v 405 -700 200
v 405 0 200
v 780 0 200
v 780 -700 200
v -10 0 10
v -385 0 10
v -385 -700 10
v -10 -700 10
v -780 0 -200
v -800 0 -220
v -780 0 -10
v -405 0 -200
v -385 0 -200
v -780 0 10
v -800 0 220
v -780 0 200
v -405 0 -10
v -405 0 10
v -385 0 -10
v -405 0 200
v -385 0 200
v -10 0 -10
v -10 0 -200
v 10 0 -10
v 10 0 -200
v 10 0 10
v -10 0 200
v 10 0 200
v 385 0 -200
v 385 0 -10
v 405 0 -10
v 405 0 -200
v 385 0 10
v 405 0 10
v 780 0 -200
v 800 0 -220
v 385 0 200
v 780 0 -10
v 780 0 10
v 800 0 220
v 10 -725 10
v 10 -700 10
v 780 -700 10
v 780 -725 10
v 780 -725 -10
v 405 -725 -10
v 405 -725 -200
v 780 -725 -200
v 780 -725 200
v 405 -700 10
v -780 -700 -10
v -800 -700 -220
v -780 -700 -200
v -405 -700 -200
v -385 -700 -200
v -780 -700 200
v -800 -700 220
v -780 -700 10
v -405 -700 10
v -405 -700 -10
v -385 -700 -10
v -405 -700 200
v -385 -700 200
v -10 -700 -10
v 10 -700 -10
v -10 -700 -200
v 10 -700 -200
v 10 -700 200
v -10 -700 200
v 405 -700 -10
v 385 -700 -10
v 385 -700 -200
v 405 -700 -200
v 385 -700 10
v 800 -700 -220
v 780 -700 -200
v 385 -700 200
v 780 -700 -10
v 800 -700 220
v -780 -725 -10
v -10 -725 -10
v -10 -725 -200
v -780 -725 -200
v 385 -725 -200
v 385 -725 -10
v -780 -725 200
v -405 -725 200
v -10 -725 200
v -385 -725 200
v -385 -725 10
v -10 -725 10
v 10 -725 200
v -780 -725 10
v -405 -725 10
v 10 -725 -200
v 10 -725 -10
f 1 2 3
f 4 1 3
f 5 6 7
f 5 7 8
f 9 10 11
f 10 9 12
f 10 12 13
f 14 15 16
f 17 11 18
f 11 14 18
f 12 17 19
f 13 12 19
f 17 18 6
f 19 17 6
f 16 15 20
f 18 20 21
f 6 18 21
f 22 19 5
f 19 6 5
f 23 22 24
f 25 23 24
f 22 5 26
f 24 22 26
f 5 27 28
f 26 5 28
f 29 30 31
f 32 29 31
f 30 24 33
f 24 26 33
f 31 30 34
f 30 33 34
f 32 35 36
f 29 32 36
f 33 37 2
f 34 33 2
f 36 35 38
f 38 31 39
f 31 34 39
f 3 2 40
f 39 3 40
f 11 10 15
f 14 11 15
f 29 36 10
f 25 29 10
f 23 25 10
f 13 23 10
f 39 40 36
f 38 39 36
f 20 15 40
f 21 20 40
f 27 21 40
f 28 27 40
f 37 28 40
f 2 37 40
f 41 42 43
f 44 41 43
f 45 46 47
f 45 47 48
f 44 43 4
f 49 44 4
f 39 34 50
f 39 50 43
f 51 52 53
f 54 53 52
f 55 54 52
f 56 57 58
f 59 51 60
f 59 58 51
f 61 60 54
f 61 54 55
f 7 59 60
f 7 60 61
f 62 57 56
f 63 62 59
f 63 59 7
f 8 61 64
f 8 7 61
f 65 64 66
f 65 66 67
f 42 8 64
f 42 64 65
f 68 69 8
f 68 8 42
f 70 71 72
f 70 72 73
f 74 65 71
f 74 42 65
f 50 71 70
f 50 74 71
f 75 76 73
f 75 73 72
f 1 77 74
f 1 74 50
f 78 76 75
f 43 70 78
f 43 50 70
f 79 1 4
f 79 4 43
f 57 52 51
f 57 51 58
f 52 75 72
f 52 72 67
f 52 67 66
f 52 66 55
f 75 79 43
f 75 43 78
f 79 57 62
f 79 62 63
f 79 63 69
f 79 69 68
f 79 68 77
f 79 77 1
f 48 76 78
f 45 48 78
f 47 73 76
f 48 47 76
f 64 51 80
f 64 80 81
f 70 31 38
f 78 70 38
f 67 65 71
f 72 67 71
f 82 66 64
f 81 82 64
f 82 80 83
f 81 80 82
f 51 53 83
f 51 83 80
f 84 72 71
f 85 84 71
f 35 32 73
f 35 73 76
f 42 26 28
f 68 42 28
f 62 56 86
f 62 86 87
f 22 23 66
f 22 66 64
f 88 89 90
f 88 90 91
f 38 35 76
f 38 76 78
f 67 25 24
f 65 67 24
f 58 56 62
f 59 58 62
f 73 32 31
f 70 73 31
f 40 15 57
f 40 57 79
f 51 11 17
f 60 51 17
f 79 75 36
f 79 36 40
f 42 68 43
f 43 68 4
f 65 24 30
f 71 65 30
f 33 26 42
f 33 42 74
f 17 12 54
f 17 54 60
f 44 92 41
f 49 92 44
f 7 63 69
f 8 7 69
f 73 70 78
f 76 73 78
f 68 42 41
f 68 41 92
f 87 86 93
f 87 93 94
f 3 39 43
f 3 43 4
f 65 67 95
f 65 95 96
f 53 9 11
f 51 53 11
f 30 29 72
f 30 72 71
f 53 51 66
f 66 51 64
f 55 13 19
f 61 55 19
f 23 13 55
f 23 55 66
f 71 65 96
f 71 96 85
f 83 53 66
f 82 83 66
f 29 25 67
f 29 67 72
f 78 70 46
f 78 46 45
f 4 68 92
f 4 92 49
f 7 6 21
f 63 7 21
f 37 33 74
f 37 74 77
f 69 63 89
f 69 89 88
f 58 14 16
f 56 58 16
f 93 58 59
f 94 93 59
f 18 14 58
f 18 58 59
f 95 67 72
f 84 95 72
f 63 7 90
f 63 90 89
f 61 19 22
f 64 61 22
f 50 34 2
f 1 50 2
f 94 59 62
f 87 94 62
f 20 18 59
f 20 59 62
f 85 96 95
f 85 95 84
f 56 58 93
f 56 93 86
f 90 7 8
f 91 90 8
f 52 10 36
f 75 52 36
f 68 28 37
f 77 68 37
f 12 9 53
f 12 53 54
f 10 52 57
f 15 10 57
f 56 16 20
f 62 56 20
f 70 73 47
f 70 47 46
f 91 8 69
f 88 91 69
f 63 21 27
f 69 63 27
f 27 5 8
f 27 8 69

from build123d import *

# Parameters (mm, degrees)
F0_W     = 1600
F0_H     = 440
F0_W_2   = 375
F0_H_2   = 190
F1_DEPTH = 700
F2_W     = 375
F2_H     = 190
F2_W_2   = 770
F3_DEPTH = 25


with BuildPart() as f1:
    # F0 (on Front) → F1 (new body)
    with BuildSketch(Plane.XZ):
        Rectangle(F0_W, F0_H)
        with Locations((-592.5, -105)):
            Rectangle(F0_W_2, F0_H_2, mode=Mode.SUBTRACT)
        with Locations((-197.5, -105)):
            Rectangle(F0_W_2, F0_H_2, mode=Mode.SUBTRACT)
        with Locations((197.5, -105)):
            Rectangle(F0_W_2, F0_H_2, mode=Mode.SUBTRACT)
        with Locations((592.5, -105)):
            Rectangle(F0_W_2, F0_H_2, mode=Mode.SUBTRACT)
        with Locations((-592.5, 105)):
            Rectangle(F0_W_2, F0_H_2, mode=Mode.SUBTRACT)
        with Locations((-197.5, 105)):
            Rectangle(F0_W_2, F0_H_2, mode=Mode.SUBTRACT)
        with Locations((197.5, 105)):
            Rectangle(F0_W_2, F0_H_2, mode=Mode.SUBTRACT)
        with Locations((592.5, 105)):
            Rectangle(F0_W_2, F0_H_2, mode=Mode.SUBTRACT)
    extrude(amount=F1_DEPTH)


with BuildPart() as f3:
    # F2 (on face) → F3 (new body)
    with BuildSketch(Plane.XZ.offset(700)):
        with Locations((-592.5, 105)):
            Rectangle(F2_W, F2_H)
        with Locations((-197.5, 105)):
            Rectangle(F2_W, F2_H)
        with Locations((197.5, -105)):
            Rectangle(F2_W, F2_H)
        with Locations((592.5, -105)):
            Rectangle(F2_W, F2_H)
        with Locations((395, 105)):
            Rectangle(F2_W_2, F2_H)
        with Locations((-395, -105)):
            Rectangle(F2_W_2, F2_H)
    extrude(amount=F3_DEPTH)


solid = Compound([f1.part, f3.part])
